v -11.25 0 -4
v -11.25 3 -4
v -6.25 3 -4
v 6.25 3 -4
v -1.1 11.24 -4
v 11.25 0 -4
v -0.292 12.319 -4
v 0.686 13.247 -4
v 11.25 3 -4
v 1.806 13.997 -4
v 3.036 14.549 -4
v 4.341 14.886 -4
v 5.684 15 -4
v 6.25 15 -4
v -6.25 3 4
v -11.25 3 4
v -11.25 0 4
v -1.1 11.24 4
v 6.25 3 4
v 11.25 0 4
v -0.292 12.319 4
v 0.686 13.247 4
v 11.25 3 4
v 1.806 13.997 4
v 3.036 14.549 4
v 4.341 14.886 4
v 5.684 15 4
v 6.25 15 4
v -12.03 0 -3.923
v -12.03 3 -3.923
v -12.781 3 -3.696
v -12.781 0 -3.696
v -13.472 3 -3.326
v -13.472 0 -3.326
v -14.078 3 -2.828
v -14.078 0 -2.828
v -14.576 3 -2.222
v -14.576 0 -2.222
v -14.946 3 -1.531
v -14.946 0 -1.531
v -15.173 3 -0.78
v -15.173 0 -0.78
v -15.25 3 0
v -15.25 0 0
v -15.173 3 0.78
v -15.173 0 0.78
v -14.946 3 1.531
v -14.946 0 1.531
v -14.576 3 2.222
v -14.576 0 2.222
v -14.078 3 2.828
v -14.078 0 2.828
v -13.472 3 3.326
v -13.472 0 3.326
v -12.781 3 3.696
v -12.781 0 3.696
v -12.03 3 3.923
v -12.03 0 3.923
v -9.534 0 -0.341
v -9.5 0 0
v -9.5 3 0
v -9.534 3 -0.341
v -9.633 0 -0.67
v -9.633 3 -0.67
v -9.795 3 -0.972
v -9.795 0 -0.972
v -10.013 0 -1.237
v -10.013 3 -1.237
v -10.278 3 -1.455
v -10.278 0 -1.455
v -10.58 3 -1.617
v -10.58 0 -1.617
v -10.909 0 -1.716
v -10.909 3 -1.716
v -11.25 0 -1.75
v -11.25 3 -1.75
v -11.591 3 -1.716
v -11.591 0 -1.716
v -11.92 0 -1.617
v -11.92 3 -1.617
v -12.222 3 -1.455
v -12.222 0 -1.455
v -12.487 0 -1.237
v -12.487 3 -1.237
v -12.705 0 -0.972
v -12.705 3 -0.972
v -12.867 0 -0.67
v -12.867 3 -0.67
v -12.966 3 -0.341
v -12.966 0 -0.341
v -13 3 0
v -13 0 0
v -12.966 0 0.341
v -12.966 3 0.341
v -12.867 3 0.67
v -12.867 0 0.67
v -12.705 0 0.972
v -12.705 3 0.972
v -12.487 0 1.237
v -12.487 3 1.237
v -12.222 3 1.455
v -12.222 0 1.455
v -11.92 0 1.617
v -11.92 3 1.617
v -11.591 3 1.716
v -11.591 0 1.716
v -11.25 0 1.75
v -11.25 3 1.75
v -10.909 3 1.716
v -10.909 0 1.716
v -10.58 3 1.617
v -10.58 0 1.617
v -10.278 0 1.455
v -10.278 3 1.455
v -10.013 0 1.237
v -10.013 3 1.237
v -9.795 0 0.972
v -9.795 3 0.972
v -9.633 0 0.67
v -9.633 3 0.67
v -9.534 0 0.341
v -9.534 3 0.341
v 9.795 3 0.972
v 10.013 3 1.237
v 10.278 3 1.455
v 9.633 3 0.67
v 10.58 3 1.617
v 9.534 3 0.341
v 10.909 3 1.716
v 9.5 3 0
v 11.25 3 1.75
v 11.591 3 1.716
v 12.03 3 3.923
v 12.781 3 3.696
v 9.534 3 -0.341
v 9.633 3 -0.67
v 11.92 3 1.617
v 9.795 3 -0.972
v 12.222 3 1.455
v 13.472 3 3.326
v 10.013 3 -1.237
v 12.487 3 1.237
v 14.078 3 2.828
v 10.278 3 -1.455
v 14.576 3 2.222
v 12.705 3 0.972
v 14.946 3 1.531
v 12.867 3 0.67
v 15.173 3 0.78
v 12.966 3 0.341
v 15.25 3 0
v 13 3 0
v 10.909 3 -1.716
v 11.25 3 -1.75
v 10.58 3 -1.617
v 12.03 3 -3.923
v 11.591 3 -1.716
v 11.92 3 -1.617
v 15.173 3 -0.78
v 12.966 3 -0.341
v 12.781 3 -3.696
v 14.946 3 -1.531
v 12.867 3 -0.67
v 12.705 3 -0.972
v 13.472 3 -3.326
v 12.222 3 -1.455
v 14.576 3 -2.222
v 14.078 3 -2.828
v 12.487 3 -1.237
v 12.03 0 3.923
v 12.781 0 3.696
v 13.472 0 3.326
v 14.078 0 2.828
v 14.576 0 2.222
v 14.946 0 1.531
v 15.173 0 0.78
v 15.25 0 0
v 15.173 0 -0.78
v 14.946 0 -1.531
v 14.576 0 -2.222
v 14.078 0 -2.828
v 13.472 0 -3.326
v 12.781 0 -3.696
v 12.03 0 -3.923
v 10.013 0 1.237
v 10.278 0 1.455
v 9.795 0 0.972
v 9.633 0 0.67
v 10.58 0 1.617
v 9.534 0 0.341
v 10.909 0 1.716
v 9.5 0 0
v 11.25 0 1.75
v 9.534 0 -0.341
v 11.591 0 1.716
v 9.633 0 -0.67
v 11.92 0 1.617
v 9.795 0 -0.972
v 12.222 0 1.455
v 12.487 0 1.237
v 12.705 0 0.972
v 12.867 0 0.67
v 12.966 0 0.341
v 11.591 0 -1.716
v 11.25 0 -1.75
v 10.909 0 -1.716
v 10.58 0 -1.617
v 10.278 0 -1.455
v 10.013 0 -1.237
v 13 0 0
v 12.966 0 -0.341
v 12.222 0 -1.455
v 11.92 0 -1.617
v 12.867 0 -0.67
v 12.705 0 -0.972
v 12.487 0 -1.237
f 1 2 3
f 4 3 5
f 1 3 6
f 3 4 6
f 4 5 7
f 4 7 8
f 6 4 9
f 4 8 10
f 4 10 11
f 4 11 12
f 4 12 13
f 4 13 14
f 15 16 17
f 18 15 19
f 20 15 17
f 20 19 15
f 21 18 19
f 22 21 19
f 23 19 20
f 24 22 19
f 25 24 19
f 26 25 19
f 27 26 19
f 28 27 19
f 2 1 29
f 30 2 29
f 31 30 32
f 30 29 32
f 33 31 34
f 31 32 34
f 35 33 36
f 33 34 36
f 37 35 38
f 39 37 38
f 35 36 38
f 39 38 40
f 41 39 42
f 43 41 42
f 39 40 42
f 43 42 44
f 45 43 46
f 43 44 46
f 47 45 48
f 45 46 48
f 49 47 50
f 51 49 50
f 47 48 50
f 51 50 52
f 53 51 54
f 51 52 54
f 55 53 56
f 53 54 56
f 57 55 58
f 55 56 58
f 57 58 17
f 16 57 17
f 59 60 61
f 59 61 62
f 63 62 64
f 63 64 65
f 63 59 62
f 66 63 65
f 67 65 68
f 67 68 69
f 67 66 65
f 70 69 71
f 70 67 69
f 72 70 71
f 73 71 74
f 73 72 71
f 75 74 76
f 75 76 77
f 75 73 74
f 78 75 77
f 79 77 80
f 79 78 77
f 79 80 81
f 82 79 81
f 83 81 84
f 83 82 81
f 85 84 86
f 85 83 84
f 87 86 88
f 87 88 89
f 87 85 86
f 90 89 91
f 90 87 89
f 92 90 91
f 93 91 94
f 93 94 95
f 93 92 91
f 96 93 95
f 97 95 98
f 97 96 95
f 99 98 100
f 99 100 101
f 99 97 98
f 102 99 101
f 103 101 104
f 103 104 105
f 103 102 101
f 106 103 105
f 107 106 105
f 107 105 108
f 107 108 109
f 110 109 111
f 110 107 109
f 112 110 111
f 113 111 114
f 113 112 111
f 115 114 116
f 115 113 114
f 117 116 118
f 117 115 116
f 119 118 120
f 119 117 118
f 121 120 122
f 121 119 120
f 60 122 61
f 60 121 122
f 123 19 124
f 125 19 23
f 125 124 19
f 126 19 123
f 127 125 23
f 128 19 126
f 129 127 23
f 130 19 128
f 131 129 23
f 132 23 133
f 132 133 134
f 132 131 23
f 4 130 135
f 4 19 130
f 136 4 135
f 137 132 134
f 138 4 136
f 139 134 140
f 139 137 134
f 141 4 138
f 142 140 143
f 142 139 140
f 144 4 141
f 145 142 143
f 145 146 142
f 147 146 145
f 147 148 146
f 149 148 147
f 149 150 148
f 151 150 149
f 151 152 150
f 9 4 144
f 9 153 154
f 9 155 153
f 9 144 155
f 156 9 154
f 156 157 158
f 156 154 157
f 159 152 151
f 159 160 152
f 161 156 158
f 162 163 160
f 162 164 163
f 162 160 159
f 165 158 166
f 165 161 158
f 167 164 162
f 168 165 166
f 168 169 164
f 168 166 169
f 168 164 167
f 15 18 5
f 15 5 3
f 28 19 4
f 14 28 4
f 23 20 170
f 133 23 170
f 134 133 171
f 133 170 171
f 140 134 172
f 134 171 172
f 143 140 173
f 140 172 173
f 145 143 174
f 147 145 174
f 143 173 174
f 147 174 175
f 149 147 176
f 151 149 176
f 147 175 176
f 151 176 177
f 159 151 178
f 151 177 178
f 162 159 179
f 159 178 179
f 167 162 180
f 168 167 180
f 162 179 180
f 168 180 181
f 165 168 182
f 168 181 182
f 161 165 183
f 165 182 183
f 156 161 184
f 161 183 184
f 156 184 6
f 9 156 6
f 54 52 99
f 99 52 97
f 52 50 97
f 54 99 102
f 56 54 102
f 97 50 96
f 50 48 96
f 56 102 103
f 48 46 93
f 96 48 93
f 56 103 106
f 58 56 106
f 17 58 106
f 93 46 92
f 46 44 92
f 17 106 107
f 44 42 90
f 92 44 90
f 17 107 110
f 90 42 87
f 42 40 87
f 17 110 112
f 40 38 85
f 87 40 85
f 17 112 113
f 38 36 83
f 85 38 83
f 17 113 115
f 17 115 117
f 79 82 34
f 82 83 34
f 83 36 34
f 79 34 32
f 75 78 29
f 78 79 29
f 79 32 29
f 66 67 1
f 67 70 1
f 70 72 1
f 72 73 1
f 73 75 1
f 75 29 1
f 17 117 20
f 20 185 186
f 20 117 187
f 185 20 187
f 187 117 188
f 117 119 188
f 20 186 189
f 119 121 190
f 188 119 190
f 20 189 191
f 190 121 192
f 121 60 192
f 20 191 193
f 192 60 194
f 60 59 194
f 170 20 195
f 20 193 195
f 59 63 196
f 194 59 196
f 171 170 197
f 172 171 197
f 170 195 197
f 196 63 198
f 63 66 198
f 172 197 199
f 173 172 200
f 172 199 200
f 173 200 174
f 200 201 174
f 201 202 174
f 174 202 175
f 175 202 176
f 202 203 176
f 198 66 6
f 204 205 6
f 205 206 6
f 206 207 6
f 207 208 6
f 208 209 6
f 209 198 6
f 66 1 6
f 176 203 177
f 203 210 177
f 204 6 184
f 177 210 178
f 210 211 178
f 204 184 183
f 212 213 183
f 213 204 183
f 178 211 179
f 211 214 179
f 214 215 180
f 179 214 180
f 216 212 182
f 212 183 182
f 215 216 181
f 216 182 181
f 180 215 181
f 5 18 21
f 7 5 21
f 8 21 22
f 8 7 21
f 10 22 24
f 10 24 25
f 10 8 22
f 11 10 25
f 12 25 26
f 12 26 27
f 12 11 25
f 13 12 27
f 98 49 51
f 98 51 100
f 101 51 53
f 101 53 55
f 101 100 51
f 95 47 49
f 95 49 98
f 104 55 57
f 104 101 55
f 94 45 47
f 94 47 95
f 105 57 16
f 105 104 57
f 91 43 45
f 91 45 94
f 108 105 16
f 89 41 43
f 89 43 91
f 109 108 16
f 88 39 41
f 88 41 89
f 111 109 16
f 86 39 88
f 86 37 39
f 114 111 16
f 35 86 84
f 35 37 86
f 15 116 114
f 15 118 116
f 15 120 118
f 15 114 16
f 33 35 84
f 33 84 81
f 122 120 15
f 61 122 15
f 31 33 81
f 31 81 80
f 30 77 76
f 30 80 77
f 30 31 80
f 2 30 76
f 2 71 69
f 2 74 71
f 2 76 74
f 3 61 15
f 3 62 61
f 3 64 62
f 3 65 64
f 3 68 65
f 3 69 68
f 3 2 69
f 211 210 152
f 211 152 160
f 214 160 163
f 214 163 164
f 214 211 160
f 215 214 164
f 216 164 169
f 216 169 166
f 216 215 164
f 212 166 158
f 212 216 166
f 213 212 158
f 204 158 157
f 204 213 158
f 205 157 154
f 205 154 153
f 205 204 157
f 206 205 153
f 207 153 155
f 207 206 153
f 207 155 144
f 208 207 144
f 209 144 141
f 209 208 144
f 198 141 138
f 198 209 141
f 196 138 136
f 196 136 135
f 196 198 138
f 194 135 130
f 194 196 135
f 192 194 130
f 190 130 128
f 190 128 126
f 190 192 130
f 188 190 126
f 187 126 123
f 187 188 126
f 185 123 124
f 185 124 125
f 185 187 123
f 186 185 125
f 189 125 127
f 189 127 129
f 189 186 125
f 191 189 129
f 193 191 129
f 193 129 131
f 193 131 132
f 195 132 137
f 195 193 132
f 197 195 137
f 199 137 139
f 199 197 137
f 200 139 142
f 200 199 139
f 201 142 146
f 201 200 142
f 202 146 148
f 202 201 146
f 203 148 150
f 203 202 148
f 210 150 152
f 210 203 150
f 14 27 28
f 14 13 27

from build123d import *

# Parameters (mm, degrees)
SKETCH1_R           = 1.75
BOSS_EXTRUDE1_DEPTH = 3
SKETCH2_W           = 5
SKETCH2_H           = 8
BOSS_EXTRUDE2_DEPTH = 12
BOSS_EXTRUDE3_DEPTH = 8
FILLET2_R           = 8


with BuildPart() as part:
    # Sketch1 → Boss-Extrude1 (new body)
    with BuildSketch(Plane(origin=(0, 0, 0), x_dir=(1, 0, 0), z_dir=(0, 1, 0))):
        with BuildLine():
            Line((-11.25, -4), (11.25, -4))
            ThreePointArc((11.25, -4), (15.25, 0), (11.25, 4))
            Line((11.25, 4), (-11.25, 4))
            ThreePointArc((-11.25, 4), (-15.25, 0), (-11.25, -4))
        make_face()
        with Locations((-11.25, 0)):
            Circle(SKETCH1_R, mode=Mode.SUBTRACT)
        with Locations((11.25, 0)):
            Circle(SKETCH1_R, mode=Mode.SUBTRACT)
    extrude(amount=BOSS_EXTRUDE1_DEPTH)

    # Sketch2 → Boss-Extrude2 (add)
    with BuildSketch(Plane(origin=(0, 3, 0), x_dir=(1, 0, 0), z_dir=(0, 1, 0))):
        with Locations((3.75, 0)):
            Rectangle(SKETCH2_W, SKETCH2_H)
    extrude(amount=BOSS_EXTRUDE2_DEPTH)

    # Sketch3 → Boss-Extrude3 (add)
    with BuildSketch(Plane.XY.offset(4)):
        Polygon((1.25, 15), (-6.25, 3), (1.25, 3), align=None)
    extrude(amount=-BOSS_EXTRUDE3_DEPTH)

    # Fillet2
    fillet2_edges = [part.edges().sort_by_distance(p)[0] for p in [
        (1.25, 15, 0),
    ]]
    fillet(fillet2_edges, radius=FILLET2_R)


solid = part.part
